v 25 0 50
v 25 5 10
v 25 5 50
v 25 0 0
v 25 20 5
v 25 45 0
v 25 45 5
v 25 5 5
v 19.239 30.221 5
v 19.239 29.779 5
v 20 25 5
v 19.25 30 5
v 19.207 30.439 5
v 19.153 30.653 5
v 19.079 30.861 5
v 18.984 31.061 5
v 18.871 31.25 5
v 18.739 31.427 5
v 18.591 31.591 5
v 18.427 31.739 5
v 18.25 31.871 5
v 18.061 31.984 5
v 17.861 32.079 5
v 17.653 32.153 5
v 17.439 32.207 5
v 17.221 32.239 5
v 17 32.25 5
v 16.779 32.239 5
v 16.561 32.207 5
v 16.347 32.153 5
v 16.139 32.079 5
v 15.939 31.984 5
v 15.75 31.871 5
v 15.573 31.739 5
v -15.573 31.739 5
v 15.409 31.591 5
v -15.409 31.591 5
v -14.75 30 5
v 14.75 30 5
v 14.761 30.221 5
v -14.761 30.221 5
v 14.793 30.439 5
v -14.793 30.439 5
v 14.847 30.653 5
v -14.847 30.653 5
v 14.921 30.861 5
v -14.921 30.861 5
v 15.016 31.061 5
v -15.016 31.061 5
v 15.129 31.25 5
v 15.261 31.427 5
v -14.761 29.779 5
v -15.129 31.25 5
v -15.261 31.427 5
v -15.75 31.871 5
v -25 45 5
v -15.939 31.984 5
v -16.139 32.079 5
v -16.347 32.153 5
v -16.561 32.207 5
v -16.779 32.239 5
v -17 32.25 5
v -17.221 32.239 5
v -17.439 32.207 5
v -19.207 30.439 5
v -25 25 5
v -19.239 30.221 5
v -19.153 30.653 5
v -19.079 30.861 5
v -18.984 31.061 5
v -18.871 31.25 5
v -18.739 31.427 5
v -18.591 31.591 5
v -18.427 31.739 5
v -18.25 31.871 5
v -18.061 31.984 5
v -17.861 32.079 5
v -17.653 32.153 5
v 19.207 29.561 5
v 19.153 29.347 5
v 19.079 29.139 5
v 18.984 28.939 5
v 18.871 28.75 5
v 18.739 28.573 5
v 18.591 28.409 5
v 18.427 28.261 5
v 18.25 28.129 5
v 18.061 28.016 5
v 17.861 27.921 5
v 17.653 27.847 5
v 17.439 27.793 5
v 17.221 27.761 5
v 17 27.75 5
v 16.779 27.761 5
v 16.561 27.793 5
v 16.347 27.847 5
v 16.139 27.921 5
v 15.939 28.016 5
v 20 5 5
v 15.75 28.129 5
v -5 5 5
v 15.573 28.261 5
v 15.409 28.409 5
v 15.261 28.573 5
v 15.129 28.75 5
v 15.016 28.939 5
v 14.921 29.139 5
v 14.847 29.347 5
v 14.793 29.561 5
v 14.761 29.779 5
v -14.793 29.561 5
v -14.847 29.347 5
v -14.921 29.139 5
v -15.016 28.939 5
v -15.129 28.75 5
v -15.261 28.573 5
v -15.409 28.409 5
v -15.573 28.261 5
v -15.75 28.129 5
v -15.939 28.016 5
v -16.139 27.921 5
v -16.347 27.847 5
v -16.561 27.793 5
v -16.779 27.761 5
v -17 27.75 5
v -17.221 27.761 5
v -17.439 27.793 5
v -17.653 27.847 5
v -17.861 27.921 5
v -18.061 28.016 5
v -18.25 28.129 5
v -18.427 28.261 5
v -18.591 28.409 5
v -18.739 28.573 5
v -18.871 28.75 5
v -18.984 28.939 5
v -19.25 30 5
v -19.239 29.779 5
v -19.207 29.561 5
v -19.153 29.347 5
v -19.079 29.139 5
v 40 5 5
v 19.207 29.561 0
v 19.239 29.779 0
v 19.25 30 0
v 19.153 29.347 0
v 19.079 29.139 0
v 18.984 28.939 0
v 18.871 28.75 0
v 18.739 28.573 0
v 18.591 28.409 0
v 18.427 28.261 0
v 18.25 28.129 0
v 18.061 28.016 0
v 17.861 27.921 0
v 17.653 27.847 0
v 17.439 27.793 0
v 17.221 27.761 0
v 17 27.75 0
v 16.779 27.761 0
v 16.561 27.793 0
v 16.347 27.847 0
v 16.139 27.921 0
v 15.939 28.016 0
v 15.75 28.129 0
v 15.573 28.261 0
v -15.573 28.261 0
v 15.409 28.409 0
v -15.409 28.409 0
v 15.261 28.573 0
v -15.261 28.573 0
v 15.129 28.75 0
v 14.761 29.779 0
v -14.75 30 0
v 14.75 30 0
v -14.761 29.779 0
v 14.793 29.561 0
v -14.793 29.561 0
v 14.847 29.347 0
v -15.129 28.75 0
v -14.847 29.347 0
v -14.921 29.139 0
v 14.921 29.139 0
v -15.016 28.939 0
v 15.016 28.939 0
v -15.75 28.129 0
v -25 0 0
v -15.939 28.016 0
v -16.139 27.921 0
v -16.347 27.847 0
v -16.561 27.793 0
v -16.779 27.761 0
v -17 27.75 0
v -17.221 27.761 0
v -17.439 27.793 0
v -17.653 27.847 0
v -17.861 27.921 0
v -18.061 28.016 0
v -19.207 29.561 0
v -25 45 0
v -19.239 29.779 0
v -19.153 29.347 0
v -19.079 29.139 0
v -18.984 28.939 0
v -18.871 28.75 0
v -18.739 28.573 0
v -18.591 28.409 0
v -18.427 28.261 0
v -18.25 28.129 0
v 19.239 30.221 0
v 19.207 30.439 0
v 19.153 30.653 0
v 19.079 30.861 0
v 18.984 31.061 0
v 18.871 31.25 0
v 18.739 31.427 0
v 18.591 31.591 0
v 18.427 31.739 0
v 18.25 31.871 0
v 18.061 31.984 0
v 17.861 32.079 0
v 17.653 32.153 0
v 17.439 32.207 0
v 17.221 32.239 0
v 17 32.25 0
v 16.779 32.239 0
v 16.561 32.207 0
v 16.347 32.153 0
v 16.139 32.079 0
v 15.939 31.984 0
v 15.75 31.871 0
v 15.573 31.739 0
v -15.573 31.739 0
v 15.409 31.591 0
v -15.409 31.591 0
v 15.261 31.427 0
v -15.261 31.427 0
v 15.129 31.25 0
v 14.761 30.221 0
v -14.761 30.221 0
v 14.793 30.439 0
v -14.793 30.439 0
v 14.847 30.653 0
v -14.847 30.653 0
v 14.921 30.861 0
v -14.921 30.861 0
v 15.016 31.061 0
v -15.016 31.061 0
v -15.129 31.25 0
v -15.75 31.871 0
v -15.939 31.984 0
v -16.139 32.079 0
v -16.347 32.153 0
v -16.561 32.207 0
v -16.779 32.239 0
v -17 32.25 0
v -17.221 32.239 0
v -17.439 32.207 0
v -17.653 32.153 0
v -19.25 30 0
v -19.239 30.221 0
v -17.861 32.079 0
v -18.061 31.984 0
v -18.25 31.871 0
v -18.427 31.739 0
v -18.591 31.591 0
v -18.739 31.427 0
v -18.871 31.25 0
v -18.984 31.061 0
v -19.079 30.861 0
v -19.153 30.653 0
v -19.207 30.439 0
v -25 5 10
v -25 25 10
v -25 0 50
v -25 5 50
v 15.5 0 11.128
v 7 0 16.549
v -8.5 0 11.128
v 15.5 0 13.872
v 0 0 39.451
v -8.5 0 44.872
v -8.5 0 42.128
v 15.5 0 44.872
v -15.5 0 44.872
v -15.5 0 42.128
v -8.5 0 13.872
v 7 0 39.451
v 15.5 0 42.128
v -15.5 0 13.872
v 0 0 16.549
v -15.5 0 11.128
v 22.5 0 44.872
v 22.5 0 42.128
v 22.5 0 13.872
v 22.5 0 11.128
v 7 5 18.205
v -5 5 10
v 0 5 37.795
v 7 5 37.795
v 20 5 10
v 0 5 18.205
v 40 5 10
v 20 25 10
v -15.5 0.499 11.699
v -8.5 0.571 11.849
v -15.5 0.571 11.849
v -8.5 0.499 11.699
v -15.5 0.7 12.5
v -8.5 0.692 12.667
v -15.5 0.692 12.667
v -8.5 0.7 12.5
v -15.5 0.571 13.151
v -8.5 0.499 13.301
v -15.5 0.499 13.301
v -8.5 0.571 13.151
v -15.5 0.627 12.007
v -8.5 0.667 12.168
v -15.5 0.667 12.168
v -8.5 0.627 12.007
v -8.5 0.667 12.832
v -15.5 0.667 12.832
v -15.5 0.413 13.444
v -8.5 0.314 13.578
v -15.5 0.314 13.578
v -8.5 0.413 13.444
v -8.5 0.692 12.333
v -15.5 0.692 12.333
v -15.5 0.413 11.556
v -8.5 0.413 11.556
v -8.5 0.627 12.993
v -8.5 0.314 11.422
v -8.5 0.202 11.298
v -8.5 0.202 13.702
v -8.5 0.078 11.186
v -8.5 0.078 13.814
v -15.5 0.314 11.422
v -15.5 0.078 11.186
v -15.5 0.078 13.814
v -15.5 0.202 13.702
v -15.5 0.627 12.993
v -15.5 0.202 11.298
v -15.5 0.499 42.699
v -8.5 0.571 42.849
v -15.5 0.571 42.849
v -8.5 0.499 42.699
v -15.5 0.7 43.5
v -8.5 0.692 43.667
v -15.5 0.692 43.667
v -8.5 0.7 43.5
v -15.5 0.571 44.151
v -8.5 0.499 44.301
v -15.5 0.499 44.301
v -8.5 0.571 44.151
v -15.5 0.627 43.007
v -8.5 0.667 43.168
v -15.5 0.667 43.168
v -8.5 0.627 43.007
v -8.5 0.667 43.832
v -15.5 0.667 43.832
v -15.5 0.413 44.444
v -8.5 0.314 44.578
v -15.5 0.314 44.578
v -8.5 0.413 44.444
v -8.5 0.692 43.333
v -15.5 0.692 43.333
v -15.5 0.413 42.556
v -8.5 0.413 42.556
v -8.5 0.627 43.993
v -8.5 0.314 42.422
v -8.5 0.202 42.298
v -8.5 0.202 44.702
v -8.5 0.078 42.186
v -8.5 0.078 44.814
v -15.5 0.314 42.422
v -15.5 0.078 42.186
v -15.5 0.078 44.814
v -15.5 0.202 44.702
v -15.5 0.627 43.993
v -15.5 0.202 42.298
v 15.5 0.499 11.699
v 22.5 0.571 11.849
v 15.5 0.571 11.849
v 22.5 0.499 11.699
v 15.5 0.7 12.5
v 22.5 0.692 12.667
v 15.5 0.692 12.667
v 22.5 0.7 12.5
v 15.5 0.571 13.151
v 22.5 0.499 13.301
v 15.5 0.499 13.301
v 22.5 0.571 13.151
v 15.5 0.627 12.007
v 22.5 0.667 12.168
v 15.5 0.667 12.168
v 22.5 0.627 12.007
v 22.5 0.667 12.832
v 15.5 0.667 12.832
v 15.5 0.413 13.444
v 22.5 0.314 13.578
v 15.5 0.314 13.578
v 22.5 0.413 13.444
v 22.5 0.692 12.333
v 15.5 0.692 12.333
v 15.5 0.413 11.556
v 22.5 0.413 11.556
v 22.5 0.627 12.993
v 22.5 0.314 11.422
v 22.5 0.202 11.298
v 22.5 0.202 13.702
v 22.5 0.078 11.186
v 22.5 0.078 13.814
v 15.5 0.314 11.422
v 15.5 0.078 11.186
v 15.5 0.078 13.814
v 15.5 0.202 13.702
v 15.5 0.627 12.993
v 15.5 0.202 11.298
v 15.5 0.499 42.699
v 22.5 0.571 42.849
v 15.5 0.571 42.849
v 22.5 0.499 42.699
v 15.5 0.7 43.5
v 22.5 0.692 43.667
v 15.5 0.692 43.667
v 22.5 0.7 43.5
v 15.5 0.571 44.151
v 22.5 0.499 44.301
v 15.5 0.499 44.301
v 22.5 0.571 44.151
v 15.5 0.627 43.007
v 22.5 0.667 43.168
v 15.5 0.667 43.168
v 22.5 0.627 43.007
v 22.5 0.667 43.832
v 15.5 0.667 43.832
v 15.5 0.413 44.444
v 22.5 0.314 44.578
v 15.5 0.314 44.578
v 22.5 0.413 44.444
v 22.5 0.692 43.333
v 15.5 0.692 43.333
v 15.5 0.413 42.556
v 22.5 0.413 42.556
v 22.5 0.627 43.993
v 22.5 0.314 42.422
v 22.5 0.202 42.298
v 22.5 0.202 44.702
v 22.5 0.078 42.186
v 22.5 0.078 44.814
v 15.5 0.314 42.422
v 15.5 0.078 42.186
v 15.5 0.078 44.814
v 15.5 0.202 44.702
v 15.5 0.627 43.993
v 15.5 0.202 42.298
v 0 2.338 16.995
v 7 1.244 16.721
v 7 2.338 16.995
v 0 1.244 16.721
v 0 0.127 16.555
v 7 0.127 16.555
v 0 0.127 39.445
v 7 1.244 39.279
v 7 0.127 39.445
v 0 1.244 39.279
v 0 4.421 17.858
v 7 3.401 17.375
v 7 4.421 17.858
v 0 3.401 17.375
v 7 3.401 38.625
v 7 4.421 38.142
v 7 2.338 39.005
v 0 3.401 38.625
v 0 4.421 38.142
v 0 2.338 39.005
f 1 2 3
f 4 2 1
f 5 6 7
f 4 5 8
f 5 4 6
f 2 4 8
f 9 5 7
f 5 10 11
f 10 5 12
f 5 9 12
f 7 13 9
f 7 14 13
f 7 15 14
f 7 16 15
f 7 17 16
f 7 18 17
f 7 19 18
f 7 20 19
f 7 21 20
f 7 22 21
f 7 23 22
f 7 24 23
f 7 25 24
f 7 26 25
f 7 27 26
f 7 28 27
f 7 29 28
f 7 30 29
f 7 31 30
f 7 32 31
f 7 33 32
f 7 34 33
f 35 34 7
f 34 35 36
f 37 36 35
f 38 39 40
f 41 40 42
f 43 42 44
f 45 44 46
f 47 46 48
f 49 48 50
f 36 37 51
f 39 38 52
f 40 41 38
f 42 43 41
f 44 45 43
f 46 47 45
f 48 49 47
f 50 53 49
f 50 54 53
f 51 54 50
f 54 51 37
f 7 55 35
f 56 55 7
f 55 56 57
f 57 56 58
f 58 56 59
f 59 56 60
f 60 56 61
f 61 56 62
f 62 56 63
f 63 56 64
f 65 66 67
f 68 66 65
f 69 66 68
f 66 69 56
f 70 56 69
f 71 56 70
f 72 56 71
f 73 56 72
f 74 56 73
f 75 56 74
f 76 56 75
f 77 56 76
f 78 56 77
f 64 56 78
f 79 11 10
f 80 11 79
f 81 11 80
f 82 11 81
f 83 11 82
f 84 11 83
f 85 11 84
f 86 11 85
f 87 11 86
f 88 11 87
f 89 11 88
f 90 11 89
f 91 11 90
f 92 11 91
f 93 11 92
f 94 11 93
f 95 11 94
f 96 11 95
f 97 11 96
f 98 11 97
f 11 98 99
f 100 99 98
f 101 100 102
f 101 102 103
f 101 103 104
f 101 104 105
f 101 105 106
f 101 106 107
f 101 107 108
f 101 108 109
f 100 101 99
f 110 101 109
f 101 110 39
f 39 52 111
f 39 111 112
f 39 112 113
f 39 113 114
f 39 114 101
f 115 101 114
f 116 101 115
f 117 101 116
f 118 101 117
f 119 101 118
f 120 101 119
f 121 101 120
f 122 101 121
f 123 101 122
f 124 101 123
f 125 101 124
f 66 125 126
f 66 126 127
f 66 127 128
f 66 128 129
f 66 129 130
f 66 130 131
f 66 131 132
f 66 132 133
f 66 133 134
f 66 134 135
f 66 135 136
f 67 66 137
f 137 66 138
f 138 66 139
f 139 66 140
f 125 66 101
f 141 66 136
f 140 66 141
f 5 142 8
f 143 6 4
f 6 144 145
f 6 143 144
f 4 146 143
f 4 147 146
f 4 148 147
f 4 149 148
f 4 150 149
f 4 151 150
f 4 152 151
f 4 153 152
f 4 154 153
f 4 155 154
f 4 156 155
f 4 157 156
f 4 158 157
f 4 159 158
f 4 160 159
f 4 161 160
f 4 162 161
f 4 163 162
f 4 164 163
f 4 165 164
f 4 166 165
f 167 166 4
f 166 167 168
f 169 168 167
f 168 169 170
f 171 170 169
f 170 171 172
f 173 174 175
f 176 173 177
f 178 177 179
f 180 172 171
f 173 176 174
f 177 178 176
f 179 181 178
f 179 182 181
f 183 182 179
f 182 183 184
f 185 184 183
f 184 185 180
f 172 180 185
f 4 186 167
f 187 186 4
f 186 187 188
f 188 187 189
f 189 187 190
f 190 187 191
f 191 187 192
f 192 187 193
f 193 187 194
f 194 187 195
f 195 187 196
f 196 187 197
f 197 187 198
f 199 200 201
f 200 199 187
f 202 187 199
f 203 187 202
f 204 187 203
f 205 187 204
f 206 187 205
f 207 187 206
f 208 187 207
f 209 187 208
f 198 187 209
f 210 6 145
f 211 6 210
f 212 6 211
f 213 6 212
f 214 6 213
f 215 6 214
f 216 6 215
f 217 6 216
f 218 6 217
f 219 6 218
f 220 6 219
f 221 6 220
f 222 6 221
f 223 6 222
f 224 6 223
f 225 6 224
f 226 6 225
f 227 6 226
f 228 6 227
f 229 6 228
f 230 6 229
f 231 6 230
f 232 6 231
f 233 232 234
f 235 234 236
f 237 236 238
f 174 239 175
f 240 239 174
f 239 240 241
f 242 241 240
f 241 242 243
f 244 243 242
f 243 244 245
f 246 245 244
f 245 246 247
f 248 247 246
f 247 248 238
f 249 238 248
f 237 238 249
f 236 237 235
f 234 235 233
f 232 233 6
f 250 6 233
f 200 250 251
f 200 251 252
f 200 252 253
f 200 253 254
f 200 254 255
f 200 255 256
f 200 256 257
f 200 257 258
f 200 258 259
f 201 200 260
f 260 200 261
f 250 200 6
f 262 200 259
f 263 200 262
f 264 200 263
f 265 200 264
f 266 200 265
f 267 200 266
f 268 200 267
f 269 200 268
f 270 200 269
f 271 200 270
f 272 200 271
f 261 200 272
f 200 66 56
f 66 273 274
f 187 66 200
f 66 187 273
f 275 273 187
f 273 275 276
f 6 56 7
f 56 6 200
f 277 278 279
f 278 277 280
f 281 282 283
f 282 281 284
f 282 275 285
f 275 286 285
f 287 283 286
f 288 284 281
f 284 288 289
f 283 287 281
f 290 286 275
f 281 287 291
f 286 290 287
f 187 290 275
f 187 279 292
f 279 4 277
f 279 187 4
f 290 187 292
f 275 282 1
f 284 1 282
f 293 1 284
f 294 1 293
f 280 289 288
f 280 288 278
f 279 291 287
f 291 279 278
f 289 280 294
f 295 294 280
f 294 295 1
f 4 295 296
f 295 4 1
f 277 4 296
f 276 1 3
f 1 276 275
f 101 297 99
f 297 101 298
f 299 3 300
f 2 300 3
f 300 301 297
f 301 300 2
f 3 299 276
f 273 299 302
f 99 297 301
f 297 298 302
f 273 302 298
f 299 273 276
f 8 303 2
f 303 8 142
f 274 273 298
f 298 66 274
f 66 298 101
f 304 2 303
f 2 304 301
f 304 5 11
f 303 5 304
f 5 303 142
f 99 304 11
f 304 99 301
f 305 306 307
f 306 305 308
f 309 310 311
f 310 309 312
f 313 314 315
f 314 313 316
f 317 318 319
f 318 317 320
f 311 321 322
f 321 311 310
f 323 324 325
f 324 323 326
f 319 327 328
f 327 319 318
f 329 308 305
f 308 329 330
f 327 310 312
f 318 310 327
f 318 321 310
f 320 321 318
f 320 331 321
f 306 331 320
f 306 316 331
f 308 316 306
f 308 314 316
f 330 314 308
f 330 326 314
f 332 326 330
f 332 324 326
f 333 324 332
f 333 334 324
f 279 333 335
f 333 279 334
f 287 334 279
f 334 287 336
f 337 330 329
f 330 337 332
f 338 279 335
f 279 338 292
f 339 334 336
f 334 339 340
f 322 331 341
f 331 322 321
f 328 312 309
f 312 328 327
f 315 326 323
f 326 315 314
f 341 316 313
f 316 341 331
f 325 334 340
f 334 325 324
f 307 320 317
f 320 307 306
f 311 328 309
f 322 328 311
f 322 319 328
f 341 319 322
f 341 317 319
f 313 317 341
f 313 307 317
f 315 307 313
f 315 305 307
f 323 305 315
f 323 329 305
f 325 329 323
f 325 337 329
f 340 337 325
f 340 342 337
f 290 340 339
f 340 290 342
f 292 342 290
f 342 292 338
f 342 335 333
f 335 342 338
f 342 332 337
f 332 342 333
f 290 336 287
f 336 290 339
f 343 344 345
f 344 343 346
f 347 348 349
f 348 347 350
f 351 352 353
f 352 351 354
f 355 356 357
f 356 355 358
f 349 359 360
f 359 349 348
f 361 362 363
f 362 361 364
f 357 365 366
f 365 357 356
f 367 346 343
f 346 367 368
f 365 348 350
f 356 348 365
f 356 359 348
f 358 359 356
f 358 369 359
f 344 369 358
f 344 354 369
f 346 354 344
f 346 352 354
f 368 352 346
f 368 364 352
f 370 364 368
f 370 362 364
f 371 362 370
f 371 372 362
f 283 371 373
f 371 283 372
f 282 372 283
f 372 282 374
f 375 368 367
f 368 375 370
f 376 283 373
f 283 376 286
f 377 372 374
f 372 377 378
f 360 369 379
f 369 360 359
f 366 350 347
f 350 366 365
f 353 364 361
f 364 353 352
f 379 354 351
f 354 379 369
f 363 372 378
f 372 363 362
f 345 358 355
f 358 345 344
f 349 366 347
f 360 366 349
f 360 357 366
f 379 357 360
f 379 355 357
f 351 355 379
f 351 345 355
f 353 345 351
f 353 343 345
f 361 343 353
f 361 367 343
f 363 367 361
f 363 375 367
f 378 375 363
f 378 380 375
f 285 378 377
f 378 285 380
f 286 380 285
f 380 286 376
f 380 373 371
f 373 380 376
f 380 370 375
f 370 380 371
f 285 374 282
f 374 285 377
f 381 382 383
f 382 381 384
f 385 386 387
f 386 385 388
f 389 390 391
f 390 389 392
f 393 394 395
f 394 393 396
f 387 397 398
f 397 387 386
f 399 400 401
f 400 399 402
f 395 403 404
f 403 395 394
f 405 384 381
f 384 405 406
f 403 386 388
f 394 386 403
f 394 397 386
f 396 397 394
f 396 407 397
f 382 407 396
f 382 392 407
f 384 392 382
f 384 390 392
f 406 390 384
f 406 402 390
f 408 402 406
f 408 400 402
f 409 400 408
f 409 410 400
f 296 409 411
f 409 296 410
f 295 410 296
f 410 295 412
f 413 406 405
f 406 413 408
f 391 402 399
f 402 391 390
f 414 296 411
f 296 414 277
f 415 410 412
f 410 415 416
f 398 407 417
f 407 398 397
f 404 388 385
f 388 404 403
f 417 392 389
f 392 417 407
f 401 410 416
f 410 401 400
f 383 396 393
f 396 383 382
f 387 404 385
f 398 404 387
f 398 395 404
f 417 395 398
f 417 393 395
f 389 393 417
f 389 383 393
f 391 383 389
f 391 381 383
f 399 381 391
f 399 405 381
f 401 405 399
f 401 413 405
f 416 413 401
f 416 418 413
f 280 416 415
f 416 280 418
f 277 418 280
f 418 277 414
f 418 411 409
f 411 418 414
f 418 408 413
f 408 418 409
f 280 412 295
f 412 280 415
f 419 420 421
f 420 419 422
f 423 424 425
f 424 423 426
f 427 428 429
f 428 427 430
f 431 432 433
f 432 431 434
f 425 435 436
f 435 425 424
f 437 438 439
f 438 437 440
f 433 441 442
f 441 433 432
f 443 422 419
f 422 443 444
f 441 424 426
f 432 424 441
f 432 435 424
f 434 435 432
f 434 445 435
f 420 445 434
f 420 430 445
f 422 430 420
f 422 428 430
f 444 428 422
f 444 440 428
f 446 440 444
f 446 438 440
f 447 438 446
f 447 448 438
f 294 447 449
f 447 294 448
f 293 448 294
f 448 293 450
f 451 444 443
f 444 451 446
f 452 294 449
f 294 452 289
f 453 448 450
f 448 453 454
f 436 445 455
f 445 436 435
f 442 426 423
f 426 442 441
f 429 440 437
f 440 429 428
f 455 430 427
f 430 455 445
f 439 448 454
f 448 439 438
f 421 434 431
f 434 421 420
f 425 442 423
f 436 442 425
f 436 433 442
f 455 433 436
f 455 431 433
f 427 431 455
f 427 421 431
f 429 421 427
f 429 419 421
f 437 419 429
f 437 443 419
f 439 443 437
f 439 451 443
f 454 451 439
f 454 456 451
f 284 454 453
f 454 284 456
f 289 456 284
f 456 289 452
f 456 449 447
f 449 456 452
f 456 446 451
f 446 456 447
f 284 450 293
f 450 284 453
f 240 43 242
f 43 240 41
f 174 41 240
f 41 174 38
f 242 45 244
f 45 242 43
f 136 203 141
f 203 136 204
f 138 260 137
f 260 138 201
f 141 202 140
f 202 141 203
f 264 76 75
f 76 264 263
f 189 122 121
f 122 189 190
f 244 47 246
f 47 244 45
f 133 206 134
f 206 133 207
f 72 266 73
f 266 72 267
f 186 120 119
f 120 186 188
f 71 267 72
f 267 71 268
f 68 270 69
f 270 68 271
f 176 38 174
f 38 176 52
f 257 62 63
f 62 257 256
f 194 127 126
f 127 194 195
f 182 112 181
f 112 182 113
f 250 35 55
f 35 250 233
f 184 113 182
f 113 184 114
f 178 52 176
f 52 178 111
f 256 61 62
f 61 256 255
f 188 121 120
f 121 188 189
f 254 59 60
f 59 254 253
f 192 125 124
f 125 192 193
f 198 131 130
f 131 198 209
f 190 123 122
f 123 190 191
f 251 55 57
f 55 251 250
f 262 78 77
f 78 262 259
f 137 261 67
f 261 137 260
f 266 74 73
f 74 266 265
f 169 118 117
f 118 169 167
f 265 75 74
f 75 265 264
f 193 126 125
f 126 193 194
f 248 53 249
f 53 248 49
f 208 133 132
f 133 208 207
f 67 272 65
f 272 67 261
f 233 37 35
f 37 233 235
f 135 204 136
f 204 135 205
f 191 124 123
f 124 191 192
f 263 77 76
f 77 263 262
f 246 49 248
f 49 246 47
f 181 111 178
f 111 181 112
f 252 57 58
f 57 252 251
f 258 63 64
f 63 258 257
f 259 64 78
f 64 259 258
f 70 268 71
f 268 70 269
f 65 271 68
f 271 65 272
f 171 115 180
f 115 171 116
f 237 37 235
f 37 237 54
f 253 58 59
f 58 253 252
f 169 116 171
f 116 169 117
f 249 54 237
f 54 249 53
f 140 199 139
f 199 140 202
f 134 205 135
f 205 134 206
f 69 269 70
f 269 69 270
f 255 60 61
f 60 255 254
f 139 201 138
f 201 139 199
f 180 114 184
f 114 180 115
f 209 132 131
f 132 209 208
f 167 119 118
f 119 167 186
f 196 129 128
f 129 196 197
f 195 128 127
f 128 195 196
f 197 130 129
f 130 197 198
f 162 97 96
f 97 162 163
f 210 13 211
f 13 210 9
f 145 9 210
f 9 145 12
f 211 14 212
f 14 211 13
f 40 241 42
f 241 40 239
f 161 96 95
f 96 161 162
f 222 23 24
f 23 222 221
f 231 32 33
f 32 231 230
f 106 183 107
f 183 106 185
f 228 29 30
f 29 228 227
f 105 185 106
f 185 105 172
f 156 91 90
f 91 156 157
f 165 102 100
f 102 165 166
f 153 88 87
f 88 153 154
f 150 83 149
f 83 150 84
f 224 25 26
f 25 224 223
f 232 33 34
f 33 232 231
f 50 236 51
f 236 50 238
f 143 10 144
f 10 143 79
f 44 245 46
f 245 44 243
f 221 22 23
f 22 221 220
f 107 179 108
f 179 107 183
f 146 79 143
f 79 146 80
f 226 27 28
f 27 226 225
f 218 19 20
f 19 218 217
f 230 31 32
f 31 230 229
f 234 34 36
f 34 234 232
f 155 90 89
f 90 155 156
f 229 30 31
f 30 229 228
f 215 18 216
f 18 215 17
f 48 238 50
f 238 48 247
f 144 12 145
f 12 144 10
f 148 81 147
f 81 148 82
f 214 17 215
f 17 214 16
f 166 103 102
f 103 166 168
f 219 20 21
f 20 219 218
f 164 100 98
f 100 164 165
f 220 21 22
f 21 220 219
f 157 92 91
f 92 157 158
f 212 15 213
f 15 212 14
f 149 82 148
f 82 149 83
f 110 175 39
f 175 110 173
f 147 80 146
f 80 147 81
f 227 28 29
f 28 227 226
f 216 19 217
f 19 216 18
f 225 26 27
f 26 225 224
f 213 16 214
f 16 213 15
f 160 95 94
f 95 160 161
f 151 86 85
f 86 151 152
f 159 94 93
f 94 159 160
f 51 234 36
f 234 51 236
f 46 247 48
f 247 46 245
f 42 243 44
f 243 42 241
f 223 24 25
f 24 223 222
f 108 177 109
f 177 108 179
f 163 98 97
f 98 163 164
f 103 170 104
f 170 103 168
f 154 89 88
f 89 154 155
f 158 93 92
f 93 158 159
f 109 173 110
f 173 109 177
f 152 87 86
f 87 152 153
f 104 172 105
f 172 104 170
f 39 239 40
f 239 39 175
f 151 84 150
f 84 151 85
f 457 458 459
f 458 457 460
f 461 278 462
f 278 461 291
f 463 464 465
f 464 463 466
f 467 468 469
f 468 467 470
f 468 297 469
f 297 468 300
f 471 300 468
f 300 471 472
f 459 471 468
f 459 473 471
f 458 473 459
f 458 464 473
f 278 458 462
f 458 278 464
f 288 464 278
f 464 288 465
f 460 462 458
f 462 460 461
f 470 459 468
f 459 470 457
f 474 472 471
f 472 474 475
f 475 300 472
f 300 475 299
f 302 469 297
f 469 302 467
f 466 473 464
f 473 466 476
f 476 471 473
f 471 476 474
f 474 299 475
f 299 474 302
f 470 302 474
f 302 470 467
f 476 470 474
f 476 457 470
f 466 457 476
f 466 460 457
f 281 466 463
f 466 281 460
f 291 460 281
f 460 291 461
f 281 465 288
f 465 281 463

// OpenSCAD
// L-shaped NEMA 17 Stepper Motor Mounting Bracket
// Designed for syringe pump applications.

// --- Dimensions ---
// Base Plate
base_x_min = -25;
base_x_max = 25;
base_y_min = 0;
base_y_max = 45;
base_z_max = 5;

// M4 Holes (Base)
m4_hole_d = 4.5;
m4_x1 = -17;
m4_y1 = 30;
m4_x2 = 17;
m4_y2 = 30;

// Vertical Motor Plate
vert_x_min = -25;
vert_x_max = 25;
vert_y_min = 0;
vert_y_max = 5;
vert_z_max = 50;

// Motor Boss Hole (Vertical Plate)
boss_d = 23;
boss_x = 0;
boss_z = 28;
boss_y_offset = 2.5; // Center of the 5mm thick plate

// M3 Holes (Motor Plate)
m3_hole_d = 3.4;
m3_pattern_size = 31;

// Gussets
gusset_thick = 5;
gusset_leg_y = 20;
gusset_leg_z = 20;
gusset_y_start = 5;
gusset_z_start = 5;

$fn = 64;

// --- Modeling ---

module gusset() {
    // Right triangle in YZ plane, extruded along X
    // Corner at (y_start, z_start)
    // Legs: 20mm along Y, 20mm along Z
    rotate([0, 0, 0])
    linear_extrude(height = gusset_thick)
    polygon(points = [
        [0, 0],
        [gusset_leg_y, 0],
        [0, gusset_leg_z]
    ]);
}

difference() {
    // Main Body
    union() {
        // Base Plate
        translate([base_x_min, base_y_min, 0])
            cube([base_x_max - base_x_min, base_y_max - base_y_min, base_z_max]);
        
        // Vertical Motor Plate
        translate([vert_x_min, vert_y_min, 0])
            cube([vert_x_max - vert_x_min, vert_y_max, vert_z_max]);
            
        // Gusset Left
        translate([vert_x_min, gusset_y_start, gusset_z_start])
            gusset();
            
        // Gusset Right
        translate([vert_x_max - gusset_thick, gusset_y_start, gusset_z_start])
            gusset();
    }

    // --- Subtractions ---

    // M4 Holes in Base Plate (Vertical through-holes)
    translate([m4_x1, m4_y1, -1]) 
        cylinder(h = base_z_max + 2, d = m4_hole_d);
    translate([m4_x2, m4_y2, -1]) 
        cylinder(h = base_z_max + 2, d = m4_hole_d);

    // Motor Boss Hole (Through the vertical plate along Y)
    translate([boss_x, -1, boss_z])
        rotate([0, 90, 0])
        cylinder(h = vert_y_max + 2, d = boss_d);

    // M3 Screw Holes (4 holes on 31mm square pattern)
    // Pattern is centered on the boss hole
    for (sx = [-1, 1], sy = [-1, 1]) {
        translate([boss_x + sx * (m3_pattern_size / 2), -1, boss_z + sy * (m3_pattern_size / 2)])
            rotate([0, 90, 0])
            cylinder(h = vert_y_max + 2, d = m3_hole_d);
    }
}
